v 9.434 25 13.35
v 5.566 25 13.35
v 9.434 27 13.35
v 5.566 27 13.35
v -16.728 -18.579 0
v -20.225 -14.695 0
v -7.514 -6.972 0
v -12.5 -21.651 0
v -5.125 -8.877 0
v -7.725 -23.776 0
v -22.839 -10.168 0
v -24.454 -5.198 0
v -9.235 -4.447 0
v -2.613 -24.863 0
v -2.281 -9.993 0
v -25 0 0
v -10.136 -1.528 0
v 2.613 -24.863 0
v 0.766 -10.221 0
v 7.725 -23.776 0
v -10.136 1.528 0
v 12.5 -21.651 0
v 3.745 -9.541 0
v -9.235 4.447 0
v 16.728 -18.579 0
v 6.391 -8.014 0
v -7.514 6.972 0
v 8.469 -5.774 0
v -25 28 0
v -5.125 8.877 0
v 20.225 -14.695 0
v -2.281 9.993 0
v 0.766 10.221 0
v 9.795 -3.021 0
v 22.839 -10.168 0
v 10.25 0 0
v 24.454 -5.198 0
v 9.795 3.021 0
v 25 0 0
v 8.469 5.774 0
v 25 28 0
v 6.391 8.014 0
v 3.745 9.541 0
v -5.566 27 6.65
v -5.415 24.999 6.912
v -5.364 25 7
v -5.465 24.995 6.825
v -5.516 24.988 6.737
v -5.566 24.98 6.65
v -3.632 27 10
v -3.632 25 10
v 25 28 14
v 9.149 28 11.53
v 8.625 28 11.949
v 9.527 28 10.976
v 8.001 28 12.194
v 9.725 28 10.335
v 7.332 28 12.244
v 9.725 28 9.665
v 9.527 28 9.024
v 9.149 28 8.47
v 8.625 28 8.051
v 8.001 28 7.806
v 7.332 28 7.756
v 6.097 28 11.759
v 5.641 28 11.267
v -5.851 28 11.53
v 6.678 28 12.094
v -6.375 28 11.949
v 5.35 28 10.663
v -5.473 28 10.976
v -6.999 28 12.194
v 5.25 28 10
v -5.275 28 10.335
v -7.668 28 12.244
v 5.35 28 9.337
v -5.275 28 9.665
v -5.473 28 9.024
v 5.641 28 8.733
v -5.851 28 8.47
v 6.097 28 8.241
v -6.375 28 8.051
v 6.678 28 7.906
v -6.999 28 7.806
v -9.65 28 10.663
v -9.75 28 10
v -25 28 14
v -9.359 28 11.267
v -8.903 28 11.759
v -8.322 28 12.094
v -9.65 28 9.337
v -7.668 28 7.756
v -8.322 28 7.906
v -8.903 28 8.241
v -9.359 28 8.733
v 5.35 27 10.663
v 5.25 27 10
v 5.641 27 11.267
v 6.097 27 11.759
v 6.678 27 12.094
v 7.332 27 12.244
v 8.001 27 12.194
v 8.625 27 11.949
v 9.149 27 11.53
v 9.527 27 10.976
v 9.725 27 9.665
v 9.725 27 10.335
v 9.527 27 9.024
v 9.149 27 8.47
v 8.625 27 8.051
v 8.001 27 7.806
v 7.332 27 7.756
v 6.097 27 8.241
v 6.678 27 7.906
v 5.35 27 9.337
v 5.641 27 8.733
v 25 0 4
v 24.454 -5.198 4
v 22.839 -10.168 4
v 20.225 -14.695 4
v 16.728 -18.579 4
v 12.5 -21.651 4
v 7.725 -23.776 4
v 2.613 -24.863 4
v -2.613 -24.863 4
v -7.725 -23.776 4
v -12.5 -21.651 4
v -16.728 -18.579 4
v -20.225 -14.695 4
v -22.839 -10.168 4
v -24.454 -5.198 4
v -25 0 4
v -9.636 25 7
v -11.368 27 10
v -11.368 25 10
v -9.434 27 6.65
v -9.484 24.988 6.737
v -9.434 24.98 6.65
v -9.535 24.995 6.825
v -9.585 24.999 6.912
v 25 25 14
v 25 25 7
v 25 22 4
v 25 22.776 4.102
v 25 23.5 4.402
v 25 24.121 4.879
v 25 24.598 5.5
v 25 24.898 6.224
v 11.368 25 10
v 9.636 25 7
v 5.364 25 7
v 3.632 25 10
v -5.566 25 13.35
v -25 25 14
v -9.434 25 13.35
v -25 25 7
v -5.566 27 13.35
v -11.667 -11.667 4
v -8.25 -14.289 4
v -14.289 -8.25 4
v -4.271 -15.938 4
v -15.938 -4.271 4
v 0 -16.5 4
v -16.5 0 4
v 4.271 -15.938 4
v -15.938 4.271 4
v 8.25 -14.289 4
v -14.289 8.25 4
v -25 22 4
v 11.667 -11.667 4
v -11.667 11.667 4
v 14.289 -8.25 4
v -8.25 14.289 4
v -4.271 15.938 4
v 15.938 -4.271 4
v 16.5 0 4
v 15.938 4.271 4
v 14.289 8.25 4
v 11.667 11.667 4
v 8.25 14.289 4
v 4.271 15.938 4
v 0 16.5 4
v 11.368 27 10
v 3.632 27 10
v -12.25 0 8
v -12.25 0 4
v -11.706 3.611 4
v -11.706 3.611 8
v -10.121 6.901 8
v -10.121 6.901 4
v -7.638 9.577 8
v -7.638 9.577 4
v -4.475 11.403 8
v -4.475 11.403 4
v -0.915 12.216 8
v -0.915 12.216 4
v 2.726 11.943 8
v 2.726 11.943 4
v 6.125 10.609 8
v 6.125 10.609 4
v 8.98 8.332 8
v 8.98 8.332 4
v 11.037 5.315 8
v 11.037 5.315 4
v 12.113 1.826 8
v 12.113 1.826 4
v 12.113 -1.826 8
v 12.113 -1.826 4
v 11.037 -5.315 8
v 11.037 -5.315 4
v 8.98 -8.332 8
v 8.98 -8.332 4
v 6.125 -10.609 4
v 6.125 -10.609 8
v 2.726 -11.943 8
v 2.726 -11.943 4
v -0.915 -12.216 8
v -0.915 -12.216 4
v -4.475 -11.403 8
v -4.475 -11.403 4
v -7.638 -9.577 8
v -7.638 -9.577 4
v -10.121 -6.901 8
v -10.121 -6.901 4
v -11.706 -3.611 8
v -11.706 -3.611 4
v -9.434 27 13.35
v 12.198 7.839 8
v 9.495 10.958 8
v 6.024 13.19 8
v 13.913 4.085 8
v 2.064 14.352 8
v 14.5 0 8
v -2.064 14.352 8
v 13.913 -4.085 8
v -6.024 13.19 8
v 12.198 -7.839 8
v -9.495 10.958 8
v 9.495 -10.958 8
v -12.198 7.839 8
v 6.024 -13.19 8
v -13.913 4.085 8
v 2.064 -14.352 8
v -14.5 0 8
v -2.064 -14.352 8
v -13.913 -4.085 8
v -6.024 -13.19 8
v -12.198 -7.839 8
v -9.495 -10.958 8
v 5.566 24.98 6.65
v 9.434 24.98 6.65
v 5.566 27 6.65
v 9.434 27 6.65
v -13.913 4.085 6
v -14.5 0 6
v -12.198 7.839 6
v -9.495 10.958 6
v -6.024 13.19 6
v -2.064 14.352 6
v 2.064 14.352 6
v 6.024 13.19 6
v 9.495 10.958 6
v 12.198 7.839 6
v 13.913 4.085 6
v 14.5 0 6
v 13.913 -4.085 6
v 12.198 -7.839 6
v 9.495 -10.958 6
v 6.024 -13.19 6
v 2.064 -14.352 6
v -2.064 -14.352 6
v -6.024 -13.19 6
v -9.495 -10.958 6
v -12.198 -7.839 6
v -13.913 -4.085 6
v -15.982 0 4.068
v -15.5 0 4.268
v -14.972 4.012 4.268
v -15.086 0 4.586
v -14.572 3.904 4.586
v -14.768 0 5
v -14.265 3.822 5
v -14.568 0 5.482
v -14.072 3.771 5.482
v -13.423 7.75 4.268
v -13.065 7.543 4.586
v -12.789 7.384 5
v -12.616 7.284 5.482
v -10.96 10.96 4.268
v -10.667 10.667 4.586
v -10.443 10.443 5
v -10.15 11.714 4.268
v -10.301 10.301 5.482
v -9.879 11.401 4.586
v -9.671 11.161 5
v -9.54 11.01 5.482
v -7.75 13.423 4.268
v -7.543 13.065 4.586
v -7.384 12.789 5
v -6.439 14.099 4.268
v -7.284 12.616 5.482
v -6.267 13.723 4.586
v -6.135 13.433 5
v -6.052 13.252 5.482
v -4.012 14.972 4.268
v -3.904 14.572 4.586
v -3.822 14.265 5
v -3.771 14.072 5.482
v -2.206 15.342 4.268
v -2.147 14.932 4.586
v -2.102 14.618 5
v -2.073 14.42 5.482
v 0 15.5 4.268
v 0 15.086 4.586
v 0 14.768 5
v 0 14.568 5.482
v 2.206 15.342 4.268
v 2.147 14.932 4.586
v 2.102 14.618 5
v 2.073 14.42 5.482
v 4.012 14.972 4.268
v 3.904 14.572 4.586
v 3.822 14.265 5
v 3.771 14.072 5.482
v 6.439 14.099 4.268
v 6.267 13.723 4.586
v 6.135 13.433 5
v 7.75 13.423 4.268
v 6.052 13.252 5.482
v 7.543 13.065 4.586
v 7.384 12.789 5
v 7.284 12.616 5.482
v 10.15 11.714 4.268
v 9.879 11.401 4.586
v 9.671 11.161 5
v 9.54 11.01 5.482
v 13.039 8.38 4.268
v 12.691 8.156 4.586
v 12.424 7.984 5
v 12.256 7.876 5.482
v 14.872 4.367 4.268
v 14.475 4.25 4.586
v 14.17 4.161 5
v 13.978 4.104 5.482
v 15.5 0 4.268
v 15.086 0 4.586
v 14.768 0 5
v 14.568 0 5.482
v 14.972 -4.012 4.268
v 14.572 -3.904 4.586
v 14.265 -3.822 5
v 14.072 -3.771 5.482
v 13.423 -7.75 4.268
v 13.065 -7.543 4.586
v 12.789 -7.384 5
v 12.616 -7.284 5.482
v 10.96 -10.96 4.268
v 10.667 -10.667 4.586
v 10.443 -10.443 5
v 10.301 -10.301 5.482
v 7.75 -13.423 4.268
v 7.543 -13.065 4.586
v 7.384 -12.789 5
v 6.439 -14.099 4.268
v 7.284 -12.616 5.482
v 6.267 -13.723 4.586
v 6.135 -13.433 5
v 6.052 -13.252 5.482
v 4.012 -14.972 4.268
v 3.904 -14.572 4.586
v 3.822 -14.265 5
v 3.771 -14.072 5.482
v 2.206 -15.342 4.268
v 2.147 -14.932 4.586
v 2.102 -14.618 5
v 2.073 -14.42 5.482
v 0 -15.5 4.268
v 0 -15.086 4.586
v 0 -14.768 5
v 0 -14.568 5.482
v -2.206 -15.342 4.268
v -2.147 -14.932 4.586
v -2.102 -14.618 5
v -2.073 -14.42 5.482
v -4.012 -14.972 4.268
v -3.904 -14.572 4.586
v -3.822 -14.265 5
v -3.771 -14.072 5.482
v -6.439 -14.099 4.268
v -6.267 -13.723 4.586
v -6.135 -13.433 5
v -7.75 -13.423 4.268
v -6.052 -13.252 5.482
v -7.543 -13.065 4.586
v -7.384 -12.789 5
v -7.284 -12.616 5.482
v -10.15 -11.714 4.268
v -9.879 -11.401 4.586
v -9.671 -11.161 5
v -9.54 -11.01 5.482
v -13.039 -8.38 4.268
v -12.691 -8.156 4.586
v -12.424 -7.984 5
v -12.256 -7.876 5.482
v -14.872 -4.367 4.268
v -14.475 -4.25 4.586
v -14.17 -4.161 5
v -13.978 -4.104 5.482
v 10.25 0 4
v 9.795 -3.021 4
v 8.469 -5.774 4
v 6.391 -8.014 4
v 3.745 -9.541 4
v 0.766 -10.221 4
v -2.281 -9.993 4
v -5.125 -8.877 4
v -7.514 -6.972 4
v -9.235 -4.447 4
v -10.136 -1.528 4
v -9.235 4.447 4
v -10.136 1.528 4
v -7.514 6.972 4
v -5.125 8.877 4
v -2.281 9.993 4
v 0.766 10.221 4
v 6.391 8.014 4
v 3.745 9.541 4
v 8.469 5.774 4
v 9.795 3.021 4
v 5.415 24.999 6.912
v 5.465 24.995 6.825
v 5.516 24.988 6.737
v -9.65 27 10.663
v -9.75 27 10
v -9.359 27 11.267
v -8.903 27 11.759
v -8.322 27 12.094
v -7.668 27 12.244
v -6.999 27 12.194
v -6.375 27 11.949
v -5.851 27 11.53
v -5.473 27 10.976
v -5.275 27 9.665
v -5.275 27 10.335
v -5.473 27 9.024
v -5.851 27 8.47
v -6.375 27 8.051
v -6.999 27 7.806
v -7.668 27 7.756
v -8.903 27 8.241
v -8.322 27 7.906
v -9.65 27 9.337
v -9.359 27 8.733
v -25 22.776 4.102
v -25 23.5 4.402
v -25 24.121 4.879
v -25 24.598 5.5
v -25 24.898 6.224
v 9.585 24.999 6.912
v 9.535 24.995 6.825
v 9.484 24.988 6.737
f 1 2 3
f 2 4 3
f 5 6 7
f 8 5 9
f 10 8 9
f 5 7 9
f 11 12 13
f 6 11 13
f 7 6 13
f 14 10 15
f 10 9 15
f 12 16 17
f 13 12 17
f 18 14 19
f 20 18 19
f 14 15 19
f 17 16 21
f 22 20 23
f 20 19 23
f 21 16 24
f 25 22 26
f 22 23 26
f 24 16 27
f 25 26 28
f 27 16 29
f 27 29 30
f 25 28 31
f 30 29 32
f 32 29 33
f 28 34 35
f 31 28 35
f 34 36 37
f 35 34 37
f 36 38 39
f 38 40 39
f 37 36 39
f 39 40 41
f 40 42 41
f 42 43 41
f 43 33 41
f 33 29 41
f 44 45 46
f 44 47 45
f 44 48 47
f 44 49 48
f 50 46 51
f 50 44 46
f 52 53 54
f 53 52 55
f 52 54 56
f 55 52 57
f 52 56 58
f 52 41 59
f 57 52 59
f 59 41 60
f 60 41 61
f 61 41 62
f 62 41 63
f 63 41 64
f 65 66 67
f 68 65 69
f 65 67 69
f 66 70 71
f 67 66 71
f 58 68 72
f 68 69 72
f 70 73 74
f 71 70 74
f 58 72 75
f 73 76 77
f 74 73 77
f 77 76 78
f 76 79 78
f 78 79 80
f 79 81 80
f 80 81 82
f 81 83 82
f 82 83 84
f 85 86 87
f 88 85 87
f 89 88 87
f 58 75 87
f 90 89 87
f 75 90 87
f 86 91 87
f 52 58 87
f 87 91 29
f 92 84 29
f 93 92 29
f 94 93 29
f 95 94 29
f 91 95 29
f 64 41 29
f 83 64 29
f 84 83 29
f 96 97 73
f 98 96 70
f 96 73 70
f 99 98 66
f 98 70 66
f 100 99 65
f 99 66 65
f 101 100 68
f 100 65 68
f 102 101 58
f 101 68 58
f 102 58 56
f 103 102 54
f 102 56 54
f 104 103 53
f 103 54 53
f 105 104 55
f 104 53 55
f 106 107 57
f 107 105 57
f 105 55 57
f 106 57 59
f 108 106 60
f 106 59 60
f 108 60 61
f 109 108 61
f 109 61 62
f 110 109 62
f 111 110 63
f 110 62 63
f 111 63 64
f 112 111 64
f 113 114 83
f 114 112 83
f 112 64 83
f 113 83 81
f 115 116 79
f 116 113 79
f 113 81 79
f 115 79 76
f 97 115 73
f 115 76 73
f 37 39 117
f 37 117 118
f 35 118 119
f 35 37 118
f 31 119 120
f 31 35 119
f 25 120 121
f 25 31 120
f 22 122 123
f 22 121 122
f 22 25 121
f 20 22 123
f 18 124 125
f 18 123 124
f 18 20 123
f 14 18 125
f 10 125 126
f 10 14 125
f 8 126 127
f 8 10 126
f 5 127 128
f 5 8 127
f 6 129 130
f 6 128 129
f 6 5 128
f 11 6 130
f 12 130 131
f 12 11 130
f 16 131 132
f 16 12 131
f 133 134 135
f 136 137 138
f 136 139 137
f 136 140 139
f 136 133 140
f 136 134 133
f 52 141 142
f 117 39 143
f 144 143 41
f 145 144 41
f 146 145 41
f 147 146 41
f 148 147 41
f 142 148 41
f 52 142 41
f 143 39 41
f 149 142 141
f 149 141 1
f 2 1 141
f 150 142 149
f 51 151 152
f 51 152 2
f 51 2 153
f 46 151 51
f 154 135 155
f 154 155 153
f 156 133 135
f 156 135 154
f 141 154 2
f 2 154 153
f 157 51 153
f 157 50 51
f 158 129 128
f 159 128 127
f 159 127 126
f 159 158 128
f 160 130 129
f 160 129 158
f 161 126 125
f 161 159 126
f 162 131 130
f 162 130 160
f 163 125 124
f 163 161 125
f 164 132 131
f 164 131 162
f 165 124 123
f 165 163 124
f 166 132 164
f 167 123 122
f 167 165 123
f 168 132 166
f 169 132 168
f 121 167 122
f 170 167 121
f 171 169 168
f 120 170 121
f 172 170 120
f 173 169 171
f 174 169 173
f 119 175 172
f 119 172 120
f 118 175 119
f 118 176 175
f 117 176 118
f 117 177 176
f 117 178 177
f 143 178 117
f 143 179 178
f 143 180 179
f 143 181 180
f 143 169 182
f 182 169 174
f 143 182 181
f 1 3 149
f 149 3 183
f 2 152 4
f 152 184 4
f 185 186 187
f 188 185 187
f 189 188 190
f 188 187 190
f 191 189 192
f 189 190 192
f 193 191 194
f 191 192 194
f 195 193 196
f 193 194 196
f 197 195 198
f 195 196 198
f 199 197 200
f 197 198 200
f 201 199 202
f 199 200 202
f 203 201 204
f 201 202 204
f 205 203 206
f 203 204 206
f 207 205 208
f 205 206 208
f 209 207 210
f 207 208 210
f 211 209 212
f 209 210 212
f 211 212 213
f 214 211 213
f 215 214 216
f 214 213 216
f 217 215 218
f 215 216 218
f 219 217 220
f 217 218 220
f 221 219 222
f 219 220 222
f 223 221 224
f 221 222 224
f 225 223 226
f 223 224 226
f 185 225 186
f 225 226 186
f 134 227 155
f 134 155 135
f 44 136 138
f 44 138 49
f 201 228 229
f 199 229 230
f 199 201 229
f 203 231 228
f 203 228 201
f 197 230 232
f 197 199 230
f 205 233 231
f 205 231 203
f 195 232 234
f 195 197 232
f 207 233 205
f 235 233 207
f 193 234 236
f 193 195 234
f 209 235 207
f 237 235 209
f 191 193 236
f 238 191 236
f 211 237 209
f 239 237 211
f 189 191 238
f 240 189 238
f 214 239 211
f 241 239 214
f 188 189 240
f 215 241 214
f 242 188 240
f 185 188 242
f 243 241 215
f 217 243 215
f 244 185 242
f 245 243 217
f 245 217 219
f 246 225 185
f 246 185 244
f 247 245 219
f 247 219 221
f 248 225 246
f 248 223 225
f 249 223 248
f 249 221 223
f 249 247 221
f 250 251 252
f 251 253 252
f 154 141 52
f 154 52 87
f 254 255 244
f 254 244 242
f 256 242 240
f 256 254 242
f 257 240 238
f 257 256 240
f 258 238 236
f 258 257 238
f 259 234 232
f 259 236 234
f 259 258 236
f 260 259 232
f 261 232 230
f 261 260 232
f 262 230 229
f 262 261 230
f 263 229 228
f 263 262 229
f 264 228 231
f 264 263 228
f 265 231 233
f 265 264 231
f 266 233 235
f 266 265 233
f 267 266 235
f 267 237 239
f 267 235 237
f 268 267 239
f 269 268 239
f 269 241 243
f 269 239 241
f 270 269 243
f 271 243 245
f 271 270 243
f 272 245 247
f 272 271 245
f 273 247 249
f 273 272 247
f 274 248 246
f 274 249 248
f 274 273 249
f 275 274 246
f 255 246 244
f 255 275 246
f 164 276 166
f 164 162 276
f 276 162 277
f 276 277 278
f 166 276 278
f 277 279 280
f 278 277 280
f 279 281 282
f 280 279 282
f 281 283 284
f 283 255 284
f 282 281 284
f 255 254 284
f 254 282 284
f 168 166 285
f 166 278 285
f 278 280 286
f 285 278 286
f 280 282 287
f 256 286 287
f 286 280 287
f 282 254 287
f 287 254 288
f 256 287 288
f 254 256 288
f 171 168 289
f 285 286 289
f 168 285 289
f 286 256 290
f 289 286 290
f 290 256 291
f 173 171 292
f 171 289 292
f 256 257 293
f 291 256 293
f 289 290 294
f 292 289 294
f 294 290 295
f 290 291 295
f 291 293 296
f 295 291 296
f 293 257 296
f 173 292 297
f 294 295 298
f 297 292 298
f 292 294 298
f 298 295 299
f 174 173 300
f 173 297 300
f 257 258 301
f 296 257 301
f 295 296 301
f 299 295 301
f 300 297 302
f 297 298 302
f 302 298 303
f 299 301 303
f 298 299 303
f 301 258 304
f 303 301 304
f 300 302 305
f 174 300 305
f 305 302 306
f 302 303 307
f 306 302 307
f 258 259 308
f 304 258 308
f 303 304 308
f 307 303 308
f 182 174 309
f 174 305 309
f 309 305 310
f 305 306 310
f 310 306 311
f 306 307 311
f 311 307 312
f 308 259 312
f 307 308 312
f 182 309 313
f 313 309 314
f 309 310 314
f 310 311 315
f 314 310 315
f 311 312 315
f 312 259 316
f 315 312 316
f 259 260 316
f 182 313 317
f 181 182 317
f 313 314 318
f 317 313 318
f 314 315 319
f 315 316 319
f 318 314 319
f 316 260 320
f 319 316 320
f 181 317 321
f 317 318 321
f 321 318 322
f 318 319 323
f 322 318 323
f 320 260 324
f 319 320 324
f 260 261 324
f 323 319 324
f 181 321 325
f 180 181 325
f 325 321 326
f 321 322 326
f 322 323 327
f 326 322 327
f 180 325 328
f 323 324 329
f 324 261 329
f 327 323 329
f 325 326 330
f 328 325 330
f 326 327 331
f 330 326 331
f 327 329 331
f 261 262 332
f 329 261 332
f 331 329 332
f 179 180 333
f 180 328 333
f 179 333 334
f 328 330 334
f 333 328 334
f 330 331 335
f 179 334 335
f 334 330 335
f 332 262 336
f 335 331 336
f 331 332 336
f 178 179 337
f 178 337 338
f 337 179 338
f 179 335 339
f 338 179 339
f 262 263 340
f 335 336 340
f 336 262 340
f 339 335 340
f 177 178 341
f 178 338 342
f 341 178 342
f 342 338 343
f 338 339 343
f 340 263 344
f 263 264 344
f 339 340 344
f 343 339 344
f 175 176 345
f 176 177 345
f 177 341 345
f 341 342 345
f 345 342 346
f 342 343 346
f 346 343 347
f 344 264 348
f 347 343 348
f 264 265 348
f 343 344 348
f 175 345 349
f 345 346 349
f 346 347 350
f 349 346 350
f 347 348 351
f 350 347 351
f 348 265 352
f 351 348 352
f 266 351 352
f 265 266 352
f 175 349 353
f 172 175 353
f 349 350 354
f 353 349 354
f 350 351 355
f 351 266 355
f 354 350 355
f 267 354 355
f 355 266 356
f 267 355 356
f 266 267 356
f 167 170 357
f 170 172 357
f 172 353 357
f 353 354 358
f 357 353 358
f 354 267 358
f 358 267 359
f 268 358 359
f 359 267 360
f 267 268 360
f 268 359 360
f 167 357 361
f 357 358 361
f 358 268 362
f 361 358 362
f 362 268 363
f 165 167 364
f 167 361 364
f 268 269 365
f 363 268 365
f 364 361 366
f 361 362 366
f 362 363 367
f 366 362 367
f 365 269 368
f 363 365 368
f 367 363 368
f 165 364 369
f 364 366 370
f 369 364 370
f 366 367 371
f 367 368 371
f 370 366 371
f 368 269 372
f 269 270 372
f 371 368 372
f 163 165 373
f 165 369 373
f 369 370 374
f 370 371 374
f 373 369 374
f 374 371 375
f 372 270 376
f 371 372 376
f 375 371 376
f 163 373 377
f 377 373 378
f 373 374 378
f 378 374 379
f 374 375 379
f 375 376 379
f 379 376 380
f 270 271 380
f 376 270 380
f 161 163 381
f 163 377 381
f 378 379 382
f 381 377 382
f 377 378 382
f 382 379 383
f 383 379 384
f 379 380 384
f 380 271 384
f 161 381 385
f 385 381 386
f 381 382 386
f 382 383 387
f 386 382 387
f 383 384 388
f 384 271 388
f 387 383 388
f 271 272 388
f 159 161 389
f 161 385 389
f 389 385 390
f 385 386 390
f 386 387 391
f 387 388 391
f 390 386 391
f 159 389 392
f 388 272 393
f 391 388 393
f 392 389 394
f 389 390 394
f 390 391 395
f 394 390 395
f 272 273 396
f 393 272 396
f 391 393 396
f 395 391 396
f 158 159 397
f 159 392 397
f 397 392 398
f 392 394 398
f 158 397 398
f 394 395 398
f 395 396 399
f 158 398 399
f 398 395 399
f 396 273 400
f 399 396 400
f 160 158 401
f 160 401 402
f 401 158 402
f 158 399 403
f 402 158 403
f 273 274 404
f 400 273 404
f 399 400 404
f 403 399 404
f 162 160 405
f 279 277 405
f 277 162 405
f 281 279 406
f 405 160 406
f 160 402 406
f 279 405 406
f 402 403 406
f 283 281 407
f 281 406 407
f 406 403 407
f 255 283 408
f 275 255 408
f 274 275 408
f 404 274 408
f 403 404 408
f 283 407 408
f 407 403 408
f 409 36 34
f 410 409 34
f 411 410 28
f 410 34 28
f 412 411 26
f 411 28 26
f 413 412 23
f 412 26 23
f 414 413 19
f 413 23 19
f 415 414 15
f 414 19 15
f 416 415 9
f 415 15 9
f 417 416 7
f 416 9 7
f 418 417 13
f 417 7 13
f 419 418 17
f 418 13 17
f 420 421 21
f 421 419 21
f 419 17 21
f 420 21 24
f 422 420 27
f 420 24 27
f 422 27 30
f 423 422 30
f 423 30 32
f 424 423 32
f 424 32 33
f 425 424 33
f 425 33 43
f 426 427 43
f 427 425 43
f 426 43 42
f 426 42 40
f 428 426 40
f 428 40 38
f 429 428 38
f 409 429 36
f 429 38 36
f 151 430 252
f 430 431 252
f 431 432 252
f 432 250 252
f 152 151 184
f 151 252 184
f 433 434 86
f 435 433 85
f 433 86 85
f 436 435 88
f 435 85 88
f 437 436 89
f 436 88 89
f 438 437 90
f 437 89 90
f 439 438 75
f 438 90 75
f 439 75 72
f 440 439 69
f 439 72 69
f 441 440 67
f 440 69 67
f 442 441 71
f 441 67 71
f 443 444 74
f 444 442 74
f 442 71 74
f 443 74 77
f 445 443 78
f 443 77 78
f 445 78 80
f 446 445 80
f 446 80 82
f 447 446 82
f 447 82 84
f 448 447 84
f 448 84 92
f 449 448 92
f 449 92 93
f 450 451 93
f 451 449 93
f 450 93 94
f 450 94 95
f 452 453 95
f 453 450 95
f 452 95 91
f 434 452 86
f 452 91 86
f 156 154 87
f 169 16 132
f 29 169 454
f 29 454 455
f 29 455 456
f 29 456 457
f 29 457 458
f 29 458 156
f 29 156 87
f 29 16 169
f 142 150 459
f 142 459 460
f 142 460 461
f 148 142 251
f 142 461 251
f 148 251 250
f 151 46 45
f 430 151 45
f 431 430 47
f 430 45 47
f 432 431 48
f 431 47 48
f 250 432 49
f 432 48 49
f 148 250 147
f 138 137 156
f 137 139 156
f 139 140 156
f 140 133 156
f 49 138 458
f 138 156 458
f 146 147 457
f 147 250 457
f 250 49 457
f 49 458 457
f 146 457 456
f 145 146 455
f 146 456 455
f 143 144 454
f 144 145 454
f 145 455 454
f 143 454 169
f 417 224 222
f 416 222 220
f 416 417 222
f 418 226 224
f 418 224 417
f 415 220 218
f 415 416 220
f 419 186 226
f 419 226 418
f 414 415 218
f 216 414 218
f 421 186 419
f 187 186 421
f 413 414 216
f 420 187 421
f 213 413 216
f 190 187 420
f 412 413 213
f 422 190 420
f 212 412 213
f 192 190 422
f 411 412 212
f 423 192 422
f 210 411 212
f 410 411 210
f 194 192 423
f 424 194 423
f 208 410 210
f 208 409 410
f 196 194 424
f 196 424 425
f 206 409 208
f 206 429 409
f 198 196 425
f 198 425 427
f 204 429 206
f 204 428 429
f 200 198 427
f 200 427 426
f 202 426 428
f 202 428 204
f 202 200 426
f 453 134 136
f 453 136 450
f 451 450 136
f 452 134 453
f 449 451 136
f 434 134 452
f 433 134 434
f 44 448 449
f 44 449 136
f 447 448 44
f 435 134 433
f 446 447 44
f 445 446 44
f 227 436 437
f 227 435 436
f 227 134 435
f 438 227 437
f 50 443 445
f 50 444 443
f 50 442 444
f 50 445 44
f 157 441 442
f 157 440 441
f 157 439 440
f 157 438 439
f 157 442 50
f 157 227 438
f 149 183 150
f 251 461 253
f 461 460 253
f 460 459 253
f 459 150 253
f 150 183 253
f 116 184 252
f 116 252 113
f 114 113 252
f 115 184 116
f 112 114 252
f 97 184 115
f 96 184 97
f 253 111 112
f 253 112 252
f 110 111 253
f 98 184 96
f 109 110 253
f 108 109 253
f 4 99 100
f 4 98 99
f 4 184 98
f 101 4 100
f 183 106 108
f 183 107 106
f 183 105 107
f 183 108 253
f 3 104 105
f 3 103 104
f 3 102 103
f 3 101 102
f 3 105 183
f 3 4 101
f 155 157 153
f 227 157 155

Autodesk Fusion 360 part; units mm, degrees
sketch "Esboço1" plane through (0, 0, 0) normal (0, 0, 1) x (1, 0, 0)
  line L0 (25, 28) -> (-25, 28)
  line L1 (-25, 0) -> (-25, 28)
  line L2 (25, 0) -> (25, 28)
  arc A0 (-25, 0) -> (25, 0) centre (0, 0) ccw
  circle A1 centre (0, 0) radius 10.25
  dimension "d1" = 50
  dimension "d3" = 28
  dimension "d4" = 20.5
extrude "Extrusão1" add sketch "Esboço1" along normal blind 4
sketch "Esboço2" plane through (0, 0, 4) normal (0, 0, 1) x (-1, 0, 0)
  circle A0 centre (0, 0) radius 10.25
  arc A1 (25, 0) -> (-25, 0) centre (0, 0) ccw
  line L0 (-25, 0) -> (-25, -28)
  line L1 (-25, -28) -> (25, -28)
  line L2 (25, -28) -> (25, 0)
  line L3 (25, -28) -> (-25, -28)
  line L4 (-25, -28) -> (-25, -25)
  line L5 (-25, -25) -> (25, -25)
  line L6 (25, -25) -> (25, -28)
  dimension "d7" = 3
extrude "Extrusão2" add sketch "Esboço2" along normal blind 10 contours L0 L1 L2 L3 L4 L5 L6
fillet "Arredondamento2" radius 3 1 edges at (0, 25, 4)
sketch "Esboço3" plane through (0, 28, 0) normal (0, 1, 0) x (-1, 0, 0)
  line L0 (-25, 0) -> (25, 0)
  line L1 (25, 0) -> (25, 14)
  line L2 (25, 14) -> (-25, 14)
  line L3 (-25, 14) -> (-25, 0)
  circle A0 centre (-7.5, 10) radius 2.25
  line L4 (0, -15) -> (0, 41) construction
  circle A1 centre (7.5, 10) radius 2.25
  dimension "d14" = 4.5
  dimension "d15" = 10
  dimension "d25" = 7.5
extrude "Extrusão3" cut sketch "Esboço3" against normal up to surface (3 mm away) contours A0 | A1
sketch "Esboço4" plane through (0, 0, 4) normal (0, 0, 1) x (-1, 0, 0)
  line L0 (-25, -22) -> (25, -22)
  line L1 (25, -22) -> (25, 0)
  arc A0 (25, 0) -> (-25, 0) centre (0, 0) ccw
  line L2 (-25, 0) -> (-25, -22)
  circle A1 centre (0, 0) radius 10.25
  circle A2 centre (0, 0) radius 12.25
  circle A3 centre (0, 0) radius 14.5
  dimension "d19" = 24.5
  dimension "d20" = 29
extrude "Extrusão4" add sketch "Esboço4" along normal blind 4 contours A3
fillet "Arredondamento3" radius 2 1 edges at (13.5187, -5.2434, 4)
sketch "Esboço5" plane through (0, 25, 0) normal (0, -1, 0) x (1, 0, 0)
  circle A0 centre (7.5, 10) radius 2.25
  circle A1 centre (-7.5, 10) radius 2.25
  line L0 (-25, 7) -> (25, 7)
  line L1 (25, 7) -> (25, 14)
  line L2 (25, 14) -> (-25, 14)
  line L3 (-25, 14) -> (-25, 7)
  line L4 (-5.566, 13.3498) -> (-9.434, 13.3498)
  line L5 (-9.434, 13.3498) -> (-11.368, 10)
  line L6 (-11.368, 10) -> (-9.434, 6.6502)
  line L7 (-9.434, 6.6502) -> (-5.566, 6.6502)
  line L8 (-5.566, 6.6502) -> (-3.632, 10)
  line L9 (-3.632, 10) -> (-5.566, 13.3498)
  line L10 (0, 0) -> (0, 14) construction
  line L11 (3.632, 10) -> (5.566, 13.3498)
  line L12 (5.566, 13.3498) -> (9.434, 13.3498)
  line L13 (9.434, 13.3498) -> (11.368, 10)
  line L14 (11.368, 10) -> (9.434, 6.6502)
  line L15 (9.434, 6.6502) -> (5.566, 6.6502)
  line L16 (5.566, 6.6502) -> (3.632, 10)
  point P0 (-7.5, 10)
  dimension "d26" = 7.736
extrude "Extrusão5" cut sketch "Esboço5" along normal mid plane 4 contours L0 L4 L5 L6 L8 L9 | L0 L6 L7 L8 | L0 L11 L12 L13 L14 L16 | L0 L14 L15 L16
equation "d8 = 7.75 mm + ( 4.5 / 2 ) * 1 mm"
equation "d15 = 7.75 mm + ( 4.5 / 2 ) * 1 mm"
equation "d25 = ( 15 / 2 ) * 1 mm"
